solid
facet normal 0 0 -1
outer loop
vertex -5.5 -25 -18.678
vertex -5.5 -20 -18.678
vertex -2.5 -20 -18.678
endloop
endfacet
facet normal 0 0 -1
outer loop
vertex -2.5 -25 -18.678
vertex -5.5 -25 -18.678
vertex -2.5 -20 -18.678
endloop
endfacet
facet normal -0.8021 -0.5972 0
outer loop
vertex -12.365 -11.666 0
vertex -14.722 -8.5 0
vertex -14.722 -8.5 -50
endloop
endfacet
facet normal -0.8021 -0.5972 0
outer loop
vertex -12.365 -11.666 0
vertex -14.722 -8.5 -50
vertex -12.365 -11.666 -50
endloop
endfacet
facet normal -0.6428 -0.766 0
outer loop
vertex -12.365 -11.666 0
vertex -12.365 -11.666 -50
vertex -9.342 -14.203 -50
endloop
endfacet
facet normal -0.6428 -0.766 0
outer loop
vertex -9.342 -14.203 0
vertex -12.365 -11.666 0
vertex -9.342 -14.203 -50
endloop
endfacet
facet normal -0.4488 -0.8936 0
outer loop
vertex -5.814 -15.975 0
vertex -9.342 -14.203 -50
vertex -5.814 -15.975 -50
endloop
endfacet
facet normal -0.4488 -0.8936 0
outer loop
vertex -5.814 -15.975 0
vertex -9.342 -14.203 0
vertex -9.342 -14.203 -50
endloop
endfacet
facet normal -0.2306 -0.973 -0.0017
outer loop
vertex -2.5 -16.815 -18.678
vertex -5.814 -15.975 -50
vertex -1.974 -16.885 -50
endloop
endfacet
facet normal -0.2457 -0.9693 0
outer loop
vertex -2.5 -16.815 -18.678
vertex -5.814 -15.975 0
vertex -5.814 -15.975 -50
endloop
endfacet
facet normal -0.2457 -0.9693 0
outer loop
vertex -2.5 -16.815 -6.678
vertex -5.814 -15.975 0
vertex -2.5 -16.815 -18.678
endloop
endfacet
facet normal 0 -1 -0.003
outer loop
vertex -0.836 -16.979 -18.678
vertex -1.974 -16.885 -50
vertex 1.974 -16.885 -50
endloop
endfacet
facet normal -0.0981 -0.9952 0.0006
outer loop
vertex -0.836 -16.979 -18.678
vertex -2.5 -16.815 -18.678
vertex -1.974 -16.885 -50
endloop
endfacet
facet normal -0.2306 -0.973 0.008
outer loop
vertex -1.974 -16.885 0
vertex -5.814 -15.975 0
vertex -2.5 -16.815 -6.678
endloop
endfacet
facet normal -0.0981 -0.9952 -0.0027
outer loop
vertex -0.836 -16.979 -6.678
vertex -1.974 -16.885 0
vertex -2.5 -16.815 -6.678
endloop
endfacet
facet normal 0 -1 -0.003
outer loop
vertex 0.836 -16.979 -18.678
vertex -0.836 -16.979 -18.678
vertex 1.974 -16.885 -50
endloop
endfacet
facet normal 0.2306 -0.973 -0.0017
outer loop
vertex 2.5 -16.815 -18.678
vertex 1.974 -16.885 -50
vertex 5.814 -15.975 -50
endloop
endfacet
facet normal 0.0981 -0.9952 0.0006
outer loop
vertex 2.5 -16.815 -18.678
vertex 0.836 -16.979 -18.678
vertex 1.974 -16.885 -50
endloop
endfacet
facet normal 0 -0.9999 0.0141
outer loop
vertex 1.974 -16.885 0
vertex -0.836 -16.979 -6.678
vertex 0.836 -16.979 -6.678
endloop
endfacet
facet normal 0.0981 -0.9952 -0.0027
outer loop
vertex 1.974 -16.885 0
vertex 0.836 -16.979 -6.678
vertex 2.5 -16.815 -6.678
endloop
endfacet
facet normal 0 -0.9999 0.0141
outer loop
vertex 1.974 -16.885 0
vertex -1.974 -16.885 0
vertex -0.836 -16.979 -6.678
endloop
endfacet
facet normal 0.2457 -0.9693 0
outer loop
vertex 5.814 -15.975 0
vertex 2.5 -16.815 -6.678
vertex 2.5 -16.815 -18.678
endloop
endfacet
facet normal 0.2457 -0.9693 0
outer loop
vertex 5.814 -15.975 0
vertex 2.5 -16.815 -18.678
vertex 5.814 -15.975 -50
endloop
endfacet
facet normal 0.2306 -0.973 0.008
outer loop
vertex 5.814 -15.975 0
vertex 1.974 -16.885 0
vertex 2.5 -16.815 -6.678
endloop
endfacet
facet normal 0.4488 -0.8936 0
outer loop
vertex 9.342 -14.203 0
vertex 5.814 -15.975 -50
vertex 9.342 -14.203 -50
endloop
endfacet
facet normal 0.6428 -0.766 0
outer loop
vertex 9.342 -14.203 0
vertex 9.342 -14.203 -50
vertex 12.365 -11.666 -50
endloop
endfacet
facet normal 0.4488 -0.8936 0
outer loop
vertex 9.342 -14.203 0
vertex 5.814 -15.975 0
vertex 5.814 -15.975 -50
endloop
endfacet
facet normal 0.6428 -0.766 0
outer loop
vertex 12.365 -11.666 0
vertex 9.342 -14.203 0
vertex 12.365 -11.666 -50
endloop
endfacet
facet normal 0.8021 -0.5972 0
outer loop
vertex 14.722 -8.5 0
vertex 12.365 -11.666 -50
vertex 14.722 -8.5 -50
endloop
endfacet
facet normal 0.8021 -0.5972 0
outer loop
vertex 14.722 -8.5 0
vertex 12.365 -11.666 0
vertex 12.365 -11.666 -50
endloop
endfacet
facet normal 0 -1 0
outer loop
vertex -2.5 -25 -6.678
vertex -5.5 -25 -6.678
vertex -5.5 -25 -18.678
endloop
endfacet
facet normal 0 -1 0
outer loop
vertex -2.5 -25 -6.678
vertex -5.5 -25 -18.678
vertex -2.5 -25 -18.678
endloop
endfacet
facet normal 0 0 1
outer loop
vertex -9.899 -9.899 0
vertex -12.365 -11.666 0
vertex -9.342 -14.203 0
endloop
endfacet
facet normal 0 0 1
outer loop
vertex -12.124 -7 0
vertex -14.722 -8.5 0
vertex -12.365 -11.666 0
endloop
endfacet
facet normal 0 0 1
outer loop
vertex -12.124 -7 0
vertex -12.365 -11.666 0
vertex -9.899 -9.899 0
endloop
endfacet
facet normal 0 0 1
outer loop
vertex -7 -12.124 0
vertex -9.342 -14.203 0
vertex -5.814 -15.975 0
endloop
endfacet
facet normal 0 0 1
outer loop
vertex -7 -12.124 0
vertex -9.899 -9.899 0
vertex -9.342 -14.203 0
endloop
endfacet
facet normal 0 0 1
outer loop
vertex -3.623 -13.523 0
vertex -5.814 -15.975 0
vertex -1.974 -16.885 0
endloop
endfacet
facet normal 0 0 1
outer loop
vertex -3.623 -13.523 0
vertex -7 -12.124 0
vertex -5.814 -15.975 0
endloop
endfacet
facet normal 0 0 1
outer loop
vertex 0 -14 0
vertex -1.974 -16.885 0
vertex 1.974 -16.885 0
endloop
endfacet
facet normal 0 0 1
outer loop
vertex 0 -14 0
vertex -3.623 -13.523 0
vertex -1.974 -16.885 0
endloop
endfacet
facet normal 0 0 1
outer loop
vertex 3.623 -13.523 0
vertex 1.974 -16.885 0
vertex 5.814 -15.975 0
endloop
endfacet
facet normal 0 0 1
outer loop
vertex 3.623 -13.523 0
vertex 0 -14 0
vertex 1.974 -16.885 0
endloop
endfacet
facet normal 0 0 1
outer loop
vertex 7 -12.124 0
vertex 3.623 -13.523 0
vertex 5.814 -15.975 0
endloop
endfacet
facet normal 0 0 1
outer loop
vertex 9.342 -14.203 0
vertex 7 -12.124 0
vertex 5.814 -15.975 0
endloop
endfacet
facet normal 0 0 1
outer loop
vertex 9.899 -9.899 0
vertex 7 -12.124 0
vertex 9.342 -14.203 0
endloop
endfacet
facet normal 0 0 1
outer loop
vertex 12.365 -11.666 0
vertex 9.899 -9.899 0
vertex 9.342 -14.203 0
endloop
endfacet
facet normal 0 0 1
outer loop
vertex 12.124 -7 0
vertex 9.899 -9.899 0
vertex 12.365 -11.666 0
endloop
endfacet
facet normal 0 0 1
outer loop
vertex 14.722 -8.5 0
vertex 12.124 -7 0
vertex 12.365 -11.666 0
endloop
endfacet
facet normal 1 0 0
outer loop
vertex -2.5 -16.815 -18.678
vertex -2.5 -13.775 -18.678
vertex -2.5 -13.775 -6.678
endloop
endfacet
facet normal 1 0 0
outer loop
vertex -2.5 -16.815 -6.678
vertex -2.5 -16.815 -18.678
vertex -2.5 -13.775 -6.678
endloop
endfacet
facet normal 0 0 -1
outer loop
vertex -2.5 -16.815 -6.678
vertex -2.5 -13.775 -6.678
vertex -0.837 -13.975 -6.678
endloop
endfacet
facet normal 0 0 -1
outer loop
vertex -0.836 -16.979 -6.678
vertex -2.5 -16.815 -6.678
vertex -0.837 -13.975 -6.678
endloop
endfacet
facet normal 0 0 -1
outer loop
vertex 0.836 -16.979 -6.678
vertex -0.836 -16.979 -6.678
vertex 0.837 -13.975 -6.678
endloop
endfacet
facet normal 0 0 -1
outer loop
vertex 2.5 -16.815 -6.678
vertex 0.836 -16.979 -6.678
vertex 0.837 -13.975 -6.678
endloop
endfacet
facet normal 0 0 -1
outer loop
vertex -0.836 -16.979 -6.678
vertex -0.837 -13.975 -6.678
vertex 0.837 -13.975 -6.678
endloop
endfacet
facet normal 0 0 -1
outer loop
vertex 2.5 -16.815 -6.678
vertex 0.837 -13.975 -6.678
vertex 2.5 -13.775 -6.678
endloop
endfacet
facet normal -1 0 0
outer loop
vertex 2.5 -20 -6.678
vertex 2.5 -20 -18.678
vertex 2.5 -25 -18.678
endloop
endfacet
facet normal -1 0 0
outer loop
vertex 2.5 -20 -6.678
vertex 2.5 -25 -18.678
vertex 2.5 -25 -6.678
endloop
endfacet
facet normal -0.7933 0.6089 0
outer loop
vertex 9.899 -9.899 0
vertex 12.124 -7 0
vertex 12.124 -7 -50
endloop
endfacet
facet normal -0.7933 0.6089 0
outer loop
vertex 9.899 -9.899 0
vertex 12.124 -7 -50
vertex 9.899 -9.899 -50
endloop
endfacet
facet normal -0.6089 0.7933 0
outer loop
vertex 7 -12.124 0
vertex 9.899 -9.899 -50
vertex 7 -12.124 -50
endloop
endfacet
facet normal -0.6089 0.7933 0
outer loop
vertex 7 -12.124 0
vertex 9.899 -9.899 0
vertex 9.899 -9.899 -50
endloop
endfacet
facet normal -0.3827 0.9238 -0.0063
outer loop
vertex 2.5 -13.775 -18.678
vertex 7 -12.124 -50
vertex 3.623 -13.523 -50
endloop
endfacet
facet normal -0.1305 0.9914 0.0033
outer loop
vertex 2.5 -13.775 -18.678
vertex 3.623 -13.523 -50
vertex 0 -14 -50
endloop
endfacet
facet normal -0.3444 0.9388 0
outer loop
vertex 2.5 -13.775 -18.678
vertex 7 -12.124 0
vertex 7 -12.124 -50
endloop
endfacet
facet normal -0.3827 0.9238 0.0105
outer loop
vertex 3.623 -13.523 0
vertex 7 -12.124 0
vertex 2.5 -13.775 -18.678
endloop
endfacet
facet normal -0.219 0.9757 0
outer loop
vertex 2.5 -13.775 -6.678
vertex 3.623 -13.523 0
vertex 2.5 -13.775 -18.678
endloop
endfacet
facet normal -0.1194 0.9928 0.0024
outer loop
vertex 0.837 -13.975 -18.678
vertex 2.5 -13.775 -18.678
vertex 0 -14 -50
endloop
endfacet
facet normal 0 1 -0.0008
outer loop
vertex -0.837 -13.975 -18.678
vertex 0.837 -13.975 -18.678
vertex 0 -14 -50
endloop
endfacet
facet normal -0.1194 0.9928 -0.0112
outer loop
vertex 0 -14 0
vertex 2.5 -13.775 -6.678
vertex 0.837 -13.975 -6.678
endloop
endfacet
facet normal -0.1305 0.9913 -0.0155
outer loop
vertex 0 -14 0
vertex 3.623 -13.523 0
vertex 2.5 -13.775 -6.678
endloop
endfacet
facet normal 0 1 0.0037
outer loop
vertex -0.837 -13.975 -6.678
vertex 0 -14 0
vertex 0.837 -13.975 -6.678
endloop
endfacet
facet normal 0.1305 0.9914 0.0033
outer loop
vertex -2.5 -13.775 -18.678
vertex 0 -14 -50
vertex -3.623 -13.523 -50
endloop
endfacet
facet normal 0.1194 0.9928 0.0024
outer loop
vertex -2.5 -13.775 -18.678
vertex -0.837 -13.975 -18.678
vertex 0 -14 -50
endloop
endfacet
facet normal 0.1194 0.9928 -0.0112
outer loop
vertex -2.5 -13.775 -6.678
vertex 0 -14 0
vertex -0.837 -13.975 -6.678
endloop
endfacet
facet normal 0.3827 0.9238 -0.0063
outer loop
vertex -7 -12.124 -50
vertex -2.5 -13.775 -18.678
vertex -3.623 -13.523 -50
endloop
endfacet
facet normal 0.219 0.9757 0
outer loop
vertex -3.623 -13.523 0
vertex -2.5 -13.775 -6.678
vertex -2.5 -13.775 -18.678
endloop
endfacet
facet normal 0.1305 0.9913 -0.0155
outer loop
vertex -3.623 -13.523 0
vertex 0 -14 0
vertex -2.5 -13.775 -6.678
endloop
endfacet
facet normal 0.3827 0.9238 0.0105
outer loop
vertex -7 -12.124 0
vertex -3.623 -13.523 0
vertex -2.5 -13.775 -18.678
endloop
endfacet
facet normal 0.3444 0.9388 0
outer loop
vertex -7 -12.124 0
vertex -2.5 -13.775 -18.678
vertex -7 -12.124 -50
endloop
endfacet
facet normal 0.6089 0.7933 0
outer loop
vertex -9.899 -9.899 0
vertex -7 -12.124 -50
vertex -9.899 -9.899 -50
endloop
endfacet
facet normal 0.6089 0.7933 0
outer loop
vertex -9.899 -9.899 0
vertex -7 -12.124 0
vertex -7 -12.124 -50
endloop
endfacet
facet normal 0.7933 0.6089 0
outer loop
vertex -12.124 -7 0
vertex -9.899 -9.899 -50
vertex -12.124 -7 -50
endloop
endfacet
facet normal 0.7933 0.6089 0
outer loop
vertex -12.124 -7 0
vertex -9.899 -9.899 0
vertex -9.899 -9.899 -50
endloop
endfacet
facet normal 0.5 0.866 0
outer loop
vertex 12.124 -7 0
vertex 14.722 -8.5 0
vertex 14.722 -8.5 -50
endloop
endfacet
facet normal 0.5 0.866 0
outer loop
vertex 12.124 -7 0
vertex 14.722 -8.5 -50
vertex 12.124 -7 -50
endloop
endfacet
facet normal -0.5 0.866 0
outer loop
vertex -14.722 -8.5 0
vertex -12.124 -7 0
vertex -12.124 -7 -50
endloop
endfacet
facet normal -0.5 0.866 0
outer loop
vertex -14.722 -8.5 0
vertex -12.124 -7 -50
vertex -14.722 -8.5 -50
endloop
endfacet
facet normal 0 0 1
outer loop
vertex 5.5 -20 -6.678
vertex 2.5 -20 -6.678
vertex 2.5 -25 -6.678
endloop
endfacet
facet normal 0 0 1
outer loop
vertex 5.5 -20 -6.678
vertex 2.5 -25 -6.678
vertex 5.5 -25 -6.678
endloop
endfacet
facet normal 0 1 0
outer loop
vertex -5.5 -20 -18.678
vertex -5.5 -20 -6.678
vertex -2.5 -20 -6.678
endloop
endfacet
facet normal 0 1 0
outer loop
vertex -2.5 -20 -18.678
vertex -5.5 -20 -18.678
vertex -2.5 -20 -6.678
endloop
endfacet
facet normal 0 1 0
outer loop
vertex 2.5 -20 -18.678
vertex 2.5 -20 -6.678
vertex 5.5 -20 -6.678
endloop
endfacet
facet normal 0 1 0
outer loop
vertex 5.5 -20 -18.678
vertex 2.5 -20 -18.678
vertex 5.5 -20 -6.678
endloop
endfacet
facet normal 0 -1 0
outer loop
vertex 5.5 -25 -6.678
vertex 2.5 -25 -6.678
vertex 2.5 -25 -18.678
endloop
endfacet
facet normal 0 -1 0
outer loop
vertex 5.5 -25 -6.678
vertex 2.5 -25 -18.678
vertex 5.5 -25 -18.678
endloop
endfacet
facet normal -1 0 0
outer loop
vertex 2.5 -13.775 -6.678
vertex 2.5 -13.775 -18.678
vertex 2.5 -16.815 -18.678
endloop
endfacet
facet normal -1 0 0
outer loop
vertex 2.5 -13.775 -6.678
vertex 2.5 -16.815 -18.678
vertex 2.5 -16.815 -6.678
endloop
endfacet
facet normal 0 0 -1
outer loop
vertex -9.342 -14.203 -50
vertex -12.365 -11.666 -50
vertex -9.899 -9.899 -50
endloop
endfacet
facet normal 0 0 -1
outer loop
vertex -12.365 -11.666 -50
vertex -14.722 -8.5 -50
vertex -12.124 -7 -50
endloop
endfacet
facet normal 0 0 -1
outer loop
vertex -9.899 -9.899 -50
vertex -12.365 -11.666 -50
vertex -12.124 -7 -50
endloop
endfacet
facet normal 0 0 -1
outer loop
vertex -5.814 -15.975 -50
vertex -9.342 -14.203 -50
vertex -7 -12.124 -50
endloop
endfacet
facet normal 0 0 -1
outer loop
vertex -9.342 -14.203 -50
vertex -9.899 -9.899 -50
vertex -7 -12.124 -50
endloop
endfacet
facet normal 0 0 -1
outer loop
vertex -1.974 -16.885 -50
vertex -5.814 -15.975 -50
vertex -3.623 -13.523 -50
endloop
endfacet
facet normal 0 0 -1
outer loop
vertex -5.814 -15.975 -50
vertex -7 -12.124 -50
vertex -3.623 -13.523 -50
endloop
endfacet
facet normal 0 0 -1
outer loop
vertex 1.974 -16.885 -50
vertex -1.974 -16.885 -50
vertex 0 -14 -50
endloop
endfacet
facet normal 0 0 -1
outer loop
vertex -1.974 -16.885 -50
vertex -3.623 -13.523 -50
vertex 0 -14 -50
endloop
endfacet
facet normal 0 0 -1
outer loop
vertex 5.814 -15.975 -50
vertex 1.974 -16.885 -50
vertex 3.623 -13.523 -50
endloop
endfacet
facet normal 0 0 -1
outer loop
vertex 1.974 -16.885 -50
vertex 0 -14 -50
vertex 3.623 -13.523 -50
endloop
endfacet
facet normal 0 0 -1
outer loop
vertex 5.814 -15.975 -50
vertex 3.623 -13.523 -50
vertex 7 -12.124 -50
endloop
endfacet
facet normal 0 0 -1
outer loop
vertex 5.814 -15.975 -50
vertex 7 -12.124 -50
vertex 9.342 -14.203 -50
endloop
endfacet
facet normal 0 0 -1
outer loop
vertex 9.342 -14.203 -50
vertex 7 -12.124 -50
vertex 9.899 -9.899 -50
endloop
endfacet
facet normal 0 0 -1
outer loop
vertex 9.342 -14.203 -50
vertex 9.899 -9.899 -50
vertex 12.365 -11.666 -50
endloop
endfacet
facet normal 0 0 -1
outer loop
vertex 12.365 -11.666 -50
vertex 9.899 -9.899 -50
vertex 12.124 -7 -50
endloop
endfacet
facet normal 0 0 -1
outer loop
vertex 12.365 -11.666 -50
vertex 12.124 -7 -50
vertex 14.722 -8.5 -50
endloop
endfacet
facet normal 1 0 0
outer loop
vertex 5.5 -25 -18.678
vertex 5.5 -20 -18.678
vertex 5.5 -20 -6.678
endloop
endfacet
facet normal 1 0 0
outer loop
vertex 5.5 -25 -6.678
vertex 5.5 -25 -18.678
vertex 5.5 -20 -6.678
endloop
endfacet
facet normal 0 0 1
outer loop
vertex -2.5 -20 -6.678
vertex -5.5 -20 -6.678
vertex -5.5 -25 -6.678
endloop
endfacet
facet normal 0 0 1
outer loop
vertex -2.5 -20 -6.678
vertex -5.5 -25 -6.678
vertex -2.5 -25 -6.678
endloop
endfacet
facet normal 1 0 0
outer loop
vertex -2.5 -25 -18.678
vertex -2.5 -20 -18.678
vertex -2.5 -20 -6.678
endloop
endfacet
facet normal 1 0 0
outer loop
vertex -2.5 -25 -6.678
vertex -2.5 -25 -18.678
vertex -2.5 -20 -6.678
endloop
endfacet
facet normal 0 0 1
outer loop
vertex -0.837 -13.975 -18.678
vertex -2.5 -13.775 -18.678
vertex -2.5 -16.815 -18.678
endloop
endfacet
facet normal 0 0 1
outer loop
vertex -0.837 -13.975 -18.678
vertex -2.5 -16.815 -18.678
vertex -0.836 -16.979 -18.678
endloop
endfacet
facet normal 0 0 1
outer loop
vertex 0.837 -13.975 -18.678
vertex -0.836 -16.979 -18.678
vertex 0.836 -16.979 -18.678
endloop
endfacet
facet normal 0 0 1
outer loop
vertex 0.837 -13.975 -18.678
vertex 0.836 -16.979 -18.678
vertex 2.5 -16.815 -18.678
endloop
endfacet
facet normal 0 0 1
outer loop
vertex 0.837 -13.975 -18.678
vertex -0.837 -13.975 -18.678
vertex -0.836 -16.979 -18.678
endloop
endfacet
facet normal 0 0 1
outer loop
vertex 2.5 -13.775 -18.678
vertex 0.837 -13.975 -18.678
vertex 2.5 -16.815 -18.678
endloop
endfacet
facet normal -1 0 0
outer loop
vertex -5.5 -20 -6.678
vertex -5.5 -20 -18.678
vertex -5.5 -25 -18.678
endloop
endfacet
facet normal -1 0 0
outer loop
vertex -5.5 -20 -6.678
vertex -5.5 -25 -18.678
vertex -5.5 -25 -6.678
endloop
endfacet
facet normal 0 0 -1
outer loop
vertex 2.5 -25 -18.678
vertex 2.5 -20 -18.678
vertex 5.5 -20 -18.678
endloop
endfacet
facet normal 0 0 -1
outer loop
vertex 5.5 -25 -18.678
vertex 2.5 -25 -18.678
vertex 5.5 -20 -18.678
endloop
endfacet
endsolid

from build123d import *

# Parameters (mm, degrees)
F1_DEPTH = 50
F2_W     = 5
F2_H     = 12
F3_DEPTH = 25
F4_START = 20
F2_W_2   = 3
F4_DEPTH = 5


with BuildPart() as f1:
    # F0 (on Top) → F1 (new body)
    with BuildSketch(Plane.XY):
        with BuildLine():
            ThreePointArc((12.124355653, -7), (0, -14), (-12.124355653, -7))
            Line((-12.124355653, -7), (-14.7224318643, -8.5))
            ThreePointArc((-14.7224318643, -8.5), (0, -17), (14.7224318643, -8.5))
            Line((14.7224318643, -8.5), (12.124355653, -7))
        make_face()
    extrude(amount=-F1_DEPTH)

    # F2 (on Front) → F3 (cut)
    with BuildSketch(Plane.XZ):
        with Locations((0, -12.6776543708)):
            Rectangle(F2_W, F2_H)
    extrude(amount=F3_DEPTH, mode=Mode.SUBTRACT)


with BuildPart() as f4:
    # F2 (on Front) → F4 (new body)
    with BuildSketch(Plane.XZ.offset(F4_START)):
        with Locations((4, -12.6776543708)):
            Rectangle(F2_W_2, F2_H)
    extrude(amount=F4_DEPTH)


with BuildPart() as f4b:
    # F2 (on Front) → F4, piece 2 (new body)
    with BuildSketch(Plane.XZ.offset(F4_START)):
        with Locations((-4, -12.6776543708)):
            Rectangle(F2_W_2, F2_H)
    extrude(amount=F4_DEPTH)


solid = Compound([f1.part, f4.part, f4b.part])
